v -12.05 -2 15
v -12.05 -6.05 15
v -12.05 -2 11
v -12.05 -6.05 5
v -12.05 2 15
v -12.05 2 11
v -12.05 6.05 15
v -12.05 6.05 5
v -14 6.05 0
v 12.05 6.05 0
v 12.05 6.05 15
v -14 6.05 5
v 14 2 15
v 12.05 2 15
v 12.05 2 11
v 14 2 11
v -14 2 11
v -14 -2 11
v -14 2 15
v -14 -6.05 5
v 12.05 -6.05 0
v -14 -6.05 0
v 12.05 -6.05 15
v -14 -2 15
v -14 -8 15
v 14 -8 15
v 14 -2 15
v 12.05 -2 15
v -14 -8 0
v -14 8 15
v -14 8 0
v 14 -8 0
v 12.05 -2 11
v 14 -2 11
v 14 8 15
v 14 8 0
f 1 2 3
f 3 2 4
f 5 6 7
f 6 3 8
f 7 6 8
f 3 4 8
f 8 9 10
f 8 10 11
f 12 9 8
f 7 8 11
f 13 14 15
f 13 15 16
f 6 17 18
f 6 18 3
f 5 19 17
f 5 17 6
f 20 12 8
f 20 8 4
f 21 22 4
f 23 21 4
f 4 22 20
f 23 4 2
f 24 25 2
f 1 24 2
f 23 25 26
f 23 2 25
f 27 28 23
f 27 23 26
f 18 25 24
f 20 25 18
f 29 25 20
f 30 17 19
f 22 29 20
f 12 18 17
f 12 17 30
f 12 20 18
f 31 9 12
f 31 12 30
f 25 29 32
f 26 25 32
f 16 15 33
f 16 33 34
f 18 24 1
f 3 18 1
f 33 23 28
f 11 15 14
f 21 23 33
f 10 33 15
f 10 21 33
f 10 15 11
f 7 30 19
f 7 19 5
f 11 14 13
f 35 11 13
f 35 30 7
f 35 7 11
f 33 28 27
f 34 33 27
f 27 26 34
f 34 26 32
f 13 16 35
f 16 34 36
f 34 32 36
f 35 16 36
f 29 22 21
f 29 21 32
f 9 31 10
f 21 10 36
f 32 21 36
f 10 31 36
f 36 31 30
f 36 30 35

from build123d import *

# Parameters (mm, degrees)
SKETCH013_W     = 28
SKETCH013_H     = 16
SKETCH013_W_2   = 24.1
SKETCH013_H_2   = 12.1
PAD004_DEPTH    = 15
SKETCH014_W     = 30
SKETCH014_H     = 4
POCKET010_DEPTH = 4
SKETCH015_W     = 12.1
SKETCH015_H     = 5
POCKET011_DEPTH = 5


with BuildPart() as part:
    # Sketch013 → Pad004 (new body)
    with BuildSketch(Plane.XY):
        Rectangle(SKETCH013_W, SKETCH013_H)
        Rectangle(SKETCH013_W_2, SKETCH013_H_2, mode=Mode.SUBTRACT)
    extrude(amount=PAD004_DEPTH)

    # Sketch014 → Pocket010 (cut)
    with BuildSketch(Plane.XY.offset(15)):
        Rectangle(SKETCH014_W, SKETCH014_H)
    extrude(amount=-POCKET010_DEPTH, mode=Mode.SUBTRACT)

    # Sketch015 → Pocket011 (cut)
    with BuildSketch(Plane(origin=(-14, 0, 0), x_dir=(0, -1, 0), z_dir=(-1, 0, 0))):
        with Locations((0, 2.5)):
            Rectangle(SKETCH015_W, SKETCH015_H)
    extrude(amount=-POCKET011_DEPTH, mode=Mode.SUBTRACT)


solid = part.part
